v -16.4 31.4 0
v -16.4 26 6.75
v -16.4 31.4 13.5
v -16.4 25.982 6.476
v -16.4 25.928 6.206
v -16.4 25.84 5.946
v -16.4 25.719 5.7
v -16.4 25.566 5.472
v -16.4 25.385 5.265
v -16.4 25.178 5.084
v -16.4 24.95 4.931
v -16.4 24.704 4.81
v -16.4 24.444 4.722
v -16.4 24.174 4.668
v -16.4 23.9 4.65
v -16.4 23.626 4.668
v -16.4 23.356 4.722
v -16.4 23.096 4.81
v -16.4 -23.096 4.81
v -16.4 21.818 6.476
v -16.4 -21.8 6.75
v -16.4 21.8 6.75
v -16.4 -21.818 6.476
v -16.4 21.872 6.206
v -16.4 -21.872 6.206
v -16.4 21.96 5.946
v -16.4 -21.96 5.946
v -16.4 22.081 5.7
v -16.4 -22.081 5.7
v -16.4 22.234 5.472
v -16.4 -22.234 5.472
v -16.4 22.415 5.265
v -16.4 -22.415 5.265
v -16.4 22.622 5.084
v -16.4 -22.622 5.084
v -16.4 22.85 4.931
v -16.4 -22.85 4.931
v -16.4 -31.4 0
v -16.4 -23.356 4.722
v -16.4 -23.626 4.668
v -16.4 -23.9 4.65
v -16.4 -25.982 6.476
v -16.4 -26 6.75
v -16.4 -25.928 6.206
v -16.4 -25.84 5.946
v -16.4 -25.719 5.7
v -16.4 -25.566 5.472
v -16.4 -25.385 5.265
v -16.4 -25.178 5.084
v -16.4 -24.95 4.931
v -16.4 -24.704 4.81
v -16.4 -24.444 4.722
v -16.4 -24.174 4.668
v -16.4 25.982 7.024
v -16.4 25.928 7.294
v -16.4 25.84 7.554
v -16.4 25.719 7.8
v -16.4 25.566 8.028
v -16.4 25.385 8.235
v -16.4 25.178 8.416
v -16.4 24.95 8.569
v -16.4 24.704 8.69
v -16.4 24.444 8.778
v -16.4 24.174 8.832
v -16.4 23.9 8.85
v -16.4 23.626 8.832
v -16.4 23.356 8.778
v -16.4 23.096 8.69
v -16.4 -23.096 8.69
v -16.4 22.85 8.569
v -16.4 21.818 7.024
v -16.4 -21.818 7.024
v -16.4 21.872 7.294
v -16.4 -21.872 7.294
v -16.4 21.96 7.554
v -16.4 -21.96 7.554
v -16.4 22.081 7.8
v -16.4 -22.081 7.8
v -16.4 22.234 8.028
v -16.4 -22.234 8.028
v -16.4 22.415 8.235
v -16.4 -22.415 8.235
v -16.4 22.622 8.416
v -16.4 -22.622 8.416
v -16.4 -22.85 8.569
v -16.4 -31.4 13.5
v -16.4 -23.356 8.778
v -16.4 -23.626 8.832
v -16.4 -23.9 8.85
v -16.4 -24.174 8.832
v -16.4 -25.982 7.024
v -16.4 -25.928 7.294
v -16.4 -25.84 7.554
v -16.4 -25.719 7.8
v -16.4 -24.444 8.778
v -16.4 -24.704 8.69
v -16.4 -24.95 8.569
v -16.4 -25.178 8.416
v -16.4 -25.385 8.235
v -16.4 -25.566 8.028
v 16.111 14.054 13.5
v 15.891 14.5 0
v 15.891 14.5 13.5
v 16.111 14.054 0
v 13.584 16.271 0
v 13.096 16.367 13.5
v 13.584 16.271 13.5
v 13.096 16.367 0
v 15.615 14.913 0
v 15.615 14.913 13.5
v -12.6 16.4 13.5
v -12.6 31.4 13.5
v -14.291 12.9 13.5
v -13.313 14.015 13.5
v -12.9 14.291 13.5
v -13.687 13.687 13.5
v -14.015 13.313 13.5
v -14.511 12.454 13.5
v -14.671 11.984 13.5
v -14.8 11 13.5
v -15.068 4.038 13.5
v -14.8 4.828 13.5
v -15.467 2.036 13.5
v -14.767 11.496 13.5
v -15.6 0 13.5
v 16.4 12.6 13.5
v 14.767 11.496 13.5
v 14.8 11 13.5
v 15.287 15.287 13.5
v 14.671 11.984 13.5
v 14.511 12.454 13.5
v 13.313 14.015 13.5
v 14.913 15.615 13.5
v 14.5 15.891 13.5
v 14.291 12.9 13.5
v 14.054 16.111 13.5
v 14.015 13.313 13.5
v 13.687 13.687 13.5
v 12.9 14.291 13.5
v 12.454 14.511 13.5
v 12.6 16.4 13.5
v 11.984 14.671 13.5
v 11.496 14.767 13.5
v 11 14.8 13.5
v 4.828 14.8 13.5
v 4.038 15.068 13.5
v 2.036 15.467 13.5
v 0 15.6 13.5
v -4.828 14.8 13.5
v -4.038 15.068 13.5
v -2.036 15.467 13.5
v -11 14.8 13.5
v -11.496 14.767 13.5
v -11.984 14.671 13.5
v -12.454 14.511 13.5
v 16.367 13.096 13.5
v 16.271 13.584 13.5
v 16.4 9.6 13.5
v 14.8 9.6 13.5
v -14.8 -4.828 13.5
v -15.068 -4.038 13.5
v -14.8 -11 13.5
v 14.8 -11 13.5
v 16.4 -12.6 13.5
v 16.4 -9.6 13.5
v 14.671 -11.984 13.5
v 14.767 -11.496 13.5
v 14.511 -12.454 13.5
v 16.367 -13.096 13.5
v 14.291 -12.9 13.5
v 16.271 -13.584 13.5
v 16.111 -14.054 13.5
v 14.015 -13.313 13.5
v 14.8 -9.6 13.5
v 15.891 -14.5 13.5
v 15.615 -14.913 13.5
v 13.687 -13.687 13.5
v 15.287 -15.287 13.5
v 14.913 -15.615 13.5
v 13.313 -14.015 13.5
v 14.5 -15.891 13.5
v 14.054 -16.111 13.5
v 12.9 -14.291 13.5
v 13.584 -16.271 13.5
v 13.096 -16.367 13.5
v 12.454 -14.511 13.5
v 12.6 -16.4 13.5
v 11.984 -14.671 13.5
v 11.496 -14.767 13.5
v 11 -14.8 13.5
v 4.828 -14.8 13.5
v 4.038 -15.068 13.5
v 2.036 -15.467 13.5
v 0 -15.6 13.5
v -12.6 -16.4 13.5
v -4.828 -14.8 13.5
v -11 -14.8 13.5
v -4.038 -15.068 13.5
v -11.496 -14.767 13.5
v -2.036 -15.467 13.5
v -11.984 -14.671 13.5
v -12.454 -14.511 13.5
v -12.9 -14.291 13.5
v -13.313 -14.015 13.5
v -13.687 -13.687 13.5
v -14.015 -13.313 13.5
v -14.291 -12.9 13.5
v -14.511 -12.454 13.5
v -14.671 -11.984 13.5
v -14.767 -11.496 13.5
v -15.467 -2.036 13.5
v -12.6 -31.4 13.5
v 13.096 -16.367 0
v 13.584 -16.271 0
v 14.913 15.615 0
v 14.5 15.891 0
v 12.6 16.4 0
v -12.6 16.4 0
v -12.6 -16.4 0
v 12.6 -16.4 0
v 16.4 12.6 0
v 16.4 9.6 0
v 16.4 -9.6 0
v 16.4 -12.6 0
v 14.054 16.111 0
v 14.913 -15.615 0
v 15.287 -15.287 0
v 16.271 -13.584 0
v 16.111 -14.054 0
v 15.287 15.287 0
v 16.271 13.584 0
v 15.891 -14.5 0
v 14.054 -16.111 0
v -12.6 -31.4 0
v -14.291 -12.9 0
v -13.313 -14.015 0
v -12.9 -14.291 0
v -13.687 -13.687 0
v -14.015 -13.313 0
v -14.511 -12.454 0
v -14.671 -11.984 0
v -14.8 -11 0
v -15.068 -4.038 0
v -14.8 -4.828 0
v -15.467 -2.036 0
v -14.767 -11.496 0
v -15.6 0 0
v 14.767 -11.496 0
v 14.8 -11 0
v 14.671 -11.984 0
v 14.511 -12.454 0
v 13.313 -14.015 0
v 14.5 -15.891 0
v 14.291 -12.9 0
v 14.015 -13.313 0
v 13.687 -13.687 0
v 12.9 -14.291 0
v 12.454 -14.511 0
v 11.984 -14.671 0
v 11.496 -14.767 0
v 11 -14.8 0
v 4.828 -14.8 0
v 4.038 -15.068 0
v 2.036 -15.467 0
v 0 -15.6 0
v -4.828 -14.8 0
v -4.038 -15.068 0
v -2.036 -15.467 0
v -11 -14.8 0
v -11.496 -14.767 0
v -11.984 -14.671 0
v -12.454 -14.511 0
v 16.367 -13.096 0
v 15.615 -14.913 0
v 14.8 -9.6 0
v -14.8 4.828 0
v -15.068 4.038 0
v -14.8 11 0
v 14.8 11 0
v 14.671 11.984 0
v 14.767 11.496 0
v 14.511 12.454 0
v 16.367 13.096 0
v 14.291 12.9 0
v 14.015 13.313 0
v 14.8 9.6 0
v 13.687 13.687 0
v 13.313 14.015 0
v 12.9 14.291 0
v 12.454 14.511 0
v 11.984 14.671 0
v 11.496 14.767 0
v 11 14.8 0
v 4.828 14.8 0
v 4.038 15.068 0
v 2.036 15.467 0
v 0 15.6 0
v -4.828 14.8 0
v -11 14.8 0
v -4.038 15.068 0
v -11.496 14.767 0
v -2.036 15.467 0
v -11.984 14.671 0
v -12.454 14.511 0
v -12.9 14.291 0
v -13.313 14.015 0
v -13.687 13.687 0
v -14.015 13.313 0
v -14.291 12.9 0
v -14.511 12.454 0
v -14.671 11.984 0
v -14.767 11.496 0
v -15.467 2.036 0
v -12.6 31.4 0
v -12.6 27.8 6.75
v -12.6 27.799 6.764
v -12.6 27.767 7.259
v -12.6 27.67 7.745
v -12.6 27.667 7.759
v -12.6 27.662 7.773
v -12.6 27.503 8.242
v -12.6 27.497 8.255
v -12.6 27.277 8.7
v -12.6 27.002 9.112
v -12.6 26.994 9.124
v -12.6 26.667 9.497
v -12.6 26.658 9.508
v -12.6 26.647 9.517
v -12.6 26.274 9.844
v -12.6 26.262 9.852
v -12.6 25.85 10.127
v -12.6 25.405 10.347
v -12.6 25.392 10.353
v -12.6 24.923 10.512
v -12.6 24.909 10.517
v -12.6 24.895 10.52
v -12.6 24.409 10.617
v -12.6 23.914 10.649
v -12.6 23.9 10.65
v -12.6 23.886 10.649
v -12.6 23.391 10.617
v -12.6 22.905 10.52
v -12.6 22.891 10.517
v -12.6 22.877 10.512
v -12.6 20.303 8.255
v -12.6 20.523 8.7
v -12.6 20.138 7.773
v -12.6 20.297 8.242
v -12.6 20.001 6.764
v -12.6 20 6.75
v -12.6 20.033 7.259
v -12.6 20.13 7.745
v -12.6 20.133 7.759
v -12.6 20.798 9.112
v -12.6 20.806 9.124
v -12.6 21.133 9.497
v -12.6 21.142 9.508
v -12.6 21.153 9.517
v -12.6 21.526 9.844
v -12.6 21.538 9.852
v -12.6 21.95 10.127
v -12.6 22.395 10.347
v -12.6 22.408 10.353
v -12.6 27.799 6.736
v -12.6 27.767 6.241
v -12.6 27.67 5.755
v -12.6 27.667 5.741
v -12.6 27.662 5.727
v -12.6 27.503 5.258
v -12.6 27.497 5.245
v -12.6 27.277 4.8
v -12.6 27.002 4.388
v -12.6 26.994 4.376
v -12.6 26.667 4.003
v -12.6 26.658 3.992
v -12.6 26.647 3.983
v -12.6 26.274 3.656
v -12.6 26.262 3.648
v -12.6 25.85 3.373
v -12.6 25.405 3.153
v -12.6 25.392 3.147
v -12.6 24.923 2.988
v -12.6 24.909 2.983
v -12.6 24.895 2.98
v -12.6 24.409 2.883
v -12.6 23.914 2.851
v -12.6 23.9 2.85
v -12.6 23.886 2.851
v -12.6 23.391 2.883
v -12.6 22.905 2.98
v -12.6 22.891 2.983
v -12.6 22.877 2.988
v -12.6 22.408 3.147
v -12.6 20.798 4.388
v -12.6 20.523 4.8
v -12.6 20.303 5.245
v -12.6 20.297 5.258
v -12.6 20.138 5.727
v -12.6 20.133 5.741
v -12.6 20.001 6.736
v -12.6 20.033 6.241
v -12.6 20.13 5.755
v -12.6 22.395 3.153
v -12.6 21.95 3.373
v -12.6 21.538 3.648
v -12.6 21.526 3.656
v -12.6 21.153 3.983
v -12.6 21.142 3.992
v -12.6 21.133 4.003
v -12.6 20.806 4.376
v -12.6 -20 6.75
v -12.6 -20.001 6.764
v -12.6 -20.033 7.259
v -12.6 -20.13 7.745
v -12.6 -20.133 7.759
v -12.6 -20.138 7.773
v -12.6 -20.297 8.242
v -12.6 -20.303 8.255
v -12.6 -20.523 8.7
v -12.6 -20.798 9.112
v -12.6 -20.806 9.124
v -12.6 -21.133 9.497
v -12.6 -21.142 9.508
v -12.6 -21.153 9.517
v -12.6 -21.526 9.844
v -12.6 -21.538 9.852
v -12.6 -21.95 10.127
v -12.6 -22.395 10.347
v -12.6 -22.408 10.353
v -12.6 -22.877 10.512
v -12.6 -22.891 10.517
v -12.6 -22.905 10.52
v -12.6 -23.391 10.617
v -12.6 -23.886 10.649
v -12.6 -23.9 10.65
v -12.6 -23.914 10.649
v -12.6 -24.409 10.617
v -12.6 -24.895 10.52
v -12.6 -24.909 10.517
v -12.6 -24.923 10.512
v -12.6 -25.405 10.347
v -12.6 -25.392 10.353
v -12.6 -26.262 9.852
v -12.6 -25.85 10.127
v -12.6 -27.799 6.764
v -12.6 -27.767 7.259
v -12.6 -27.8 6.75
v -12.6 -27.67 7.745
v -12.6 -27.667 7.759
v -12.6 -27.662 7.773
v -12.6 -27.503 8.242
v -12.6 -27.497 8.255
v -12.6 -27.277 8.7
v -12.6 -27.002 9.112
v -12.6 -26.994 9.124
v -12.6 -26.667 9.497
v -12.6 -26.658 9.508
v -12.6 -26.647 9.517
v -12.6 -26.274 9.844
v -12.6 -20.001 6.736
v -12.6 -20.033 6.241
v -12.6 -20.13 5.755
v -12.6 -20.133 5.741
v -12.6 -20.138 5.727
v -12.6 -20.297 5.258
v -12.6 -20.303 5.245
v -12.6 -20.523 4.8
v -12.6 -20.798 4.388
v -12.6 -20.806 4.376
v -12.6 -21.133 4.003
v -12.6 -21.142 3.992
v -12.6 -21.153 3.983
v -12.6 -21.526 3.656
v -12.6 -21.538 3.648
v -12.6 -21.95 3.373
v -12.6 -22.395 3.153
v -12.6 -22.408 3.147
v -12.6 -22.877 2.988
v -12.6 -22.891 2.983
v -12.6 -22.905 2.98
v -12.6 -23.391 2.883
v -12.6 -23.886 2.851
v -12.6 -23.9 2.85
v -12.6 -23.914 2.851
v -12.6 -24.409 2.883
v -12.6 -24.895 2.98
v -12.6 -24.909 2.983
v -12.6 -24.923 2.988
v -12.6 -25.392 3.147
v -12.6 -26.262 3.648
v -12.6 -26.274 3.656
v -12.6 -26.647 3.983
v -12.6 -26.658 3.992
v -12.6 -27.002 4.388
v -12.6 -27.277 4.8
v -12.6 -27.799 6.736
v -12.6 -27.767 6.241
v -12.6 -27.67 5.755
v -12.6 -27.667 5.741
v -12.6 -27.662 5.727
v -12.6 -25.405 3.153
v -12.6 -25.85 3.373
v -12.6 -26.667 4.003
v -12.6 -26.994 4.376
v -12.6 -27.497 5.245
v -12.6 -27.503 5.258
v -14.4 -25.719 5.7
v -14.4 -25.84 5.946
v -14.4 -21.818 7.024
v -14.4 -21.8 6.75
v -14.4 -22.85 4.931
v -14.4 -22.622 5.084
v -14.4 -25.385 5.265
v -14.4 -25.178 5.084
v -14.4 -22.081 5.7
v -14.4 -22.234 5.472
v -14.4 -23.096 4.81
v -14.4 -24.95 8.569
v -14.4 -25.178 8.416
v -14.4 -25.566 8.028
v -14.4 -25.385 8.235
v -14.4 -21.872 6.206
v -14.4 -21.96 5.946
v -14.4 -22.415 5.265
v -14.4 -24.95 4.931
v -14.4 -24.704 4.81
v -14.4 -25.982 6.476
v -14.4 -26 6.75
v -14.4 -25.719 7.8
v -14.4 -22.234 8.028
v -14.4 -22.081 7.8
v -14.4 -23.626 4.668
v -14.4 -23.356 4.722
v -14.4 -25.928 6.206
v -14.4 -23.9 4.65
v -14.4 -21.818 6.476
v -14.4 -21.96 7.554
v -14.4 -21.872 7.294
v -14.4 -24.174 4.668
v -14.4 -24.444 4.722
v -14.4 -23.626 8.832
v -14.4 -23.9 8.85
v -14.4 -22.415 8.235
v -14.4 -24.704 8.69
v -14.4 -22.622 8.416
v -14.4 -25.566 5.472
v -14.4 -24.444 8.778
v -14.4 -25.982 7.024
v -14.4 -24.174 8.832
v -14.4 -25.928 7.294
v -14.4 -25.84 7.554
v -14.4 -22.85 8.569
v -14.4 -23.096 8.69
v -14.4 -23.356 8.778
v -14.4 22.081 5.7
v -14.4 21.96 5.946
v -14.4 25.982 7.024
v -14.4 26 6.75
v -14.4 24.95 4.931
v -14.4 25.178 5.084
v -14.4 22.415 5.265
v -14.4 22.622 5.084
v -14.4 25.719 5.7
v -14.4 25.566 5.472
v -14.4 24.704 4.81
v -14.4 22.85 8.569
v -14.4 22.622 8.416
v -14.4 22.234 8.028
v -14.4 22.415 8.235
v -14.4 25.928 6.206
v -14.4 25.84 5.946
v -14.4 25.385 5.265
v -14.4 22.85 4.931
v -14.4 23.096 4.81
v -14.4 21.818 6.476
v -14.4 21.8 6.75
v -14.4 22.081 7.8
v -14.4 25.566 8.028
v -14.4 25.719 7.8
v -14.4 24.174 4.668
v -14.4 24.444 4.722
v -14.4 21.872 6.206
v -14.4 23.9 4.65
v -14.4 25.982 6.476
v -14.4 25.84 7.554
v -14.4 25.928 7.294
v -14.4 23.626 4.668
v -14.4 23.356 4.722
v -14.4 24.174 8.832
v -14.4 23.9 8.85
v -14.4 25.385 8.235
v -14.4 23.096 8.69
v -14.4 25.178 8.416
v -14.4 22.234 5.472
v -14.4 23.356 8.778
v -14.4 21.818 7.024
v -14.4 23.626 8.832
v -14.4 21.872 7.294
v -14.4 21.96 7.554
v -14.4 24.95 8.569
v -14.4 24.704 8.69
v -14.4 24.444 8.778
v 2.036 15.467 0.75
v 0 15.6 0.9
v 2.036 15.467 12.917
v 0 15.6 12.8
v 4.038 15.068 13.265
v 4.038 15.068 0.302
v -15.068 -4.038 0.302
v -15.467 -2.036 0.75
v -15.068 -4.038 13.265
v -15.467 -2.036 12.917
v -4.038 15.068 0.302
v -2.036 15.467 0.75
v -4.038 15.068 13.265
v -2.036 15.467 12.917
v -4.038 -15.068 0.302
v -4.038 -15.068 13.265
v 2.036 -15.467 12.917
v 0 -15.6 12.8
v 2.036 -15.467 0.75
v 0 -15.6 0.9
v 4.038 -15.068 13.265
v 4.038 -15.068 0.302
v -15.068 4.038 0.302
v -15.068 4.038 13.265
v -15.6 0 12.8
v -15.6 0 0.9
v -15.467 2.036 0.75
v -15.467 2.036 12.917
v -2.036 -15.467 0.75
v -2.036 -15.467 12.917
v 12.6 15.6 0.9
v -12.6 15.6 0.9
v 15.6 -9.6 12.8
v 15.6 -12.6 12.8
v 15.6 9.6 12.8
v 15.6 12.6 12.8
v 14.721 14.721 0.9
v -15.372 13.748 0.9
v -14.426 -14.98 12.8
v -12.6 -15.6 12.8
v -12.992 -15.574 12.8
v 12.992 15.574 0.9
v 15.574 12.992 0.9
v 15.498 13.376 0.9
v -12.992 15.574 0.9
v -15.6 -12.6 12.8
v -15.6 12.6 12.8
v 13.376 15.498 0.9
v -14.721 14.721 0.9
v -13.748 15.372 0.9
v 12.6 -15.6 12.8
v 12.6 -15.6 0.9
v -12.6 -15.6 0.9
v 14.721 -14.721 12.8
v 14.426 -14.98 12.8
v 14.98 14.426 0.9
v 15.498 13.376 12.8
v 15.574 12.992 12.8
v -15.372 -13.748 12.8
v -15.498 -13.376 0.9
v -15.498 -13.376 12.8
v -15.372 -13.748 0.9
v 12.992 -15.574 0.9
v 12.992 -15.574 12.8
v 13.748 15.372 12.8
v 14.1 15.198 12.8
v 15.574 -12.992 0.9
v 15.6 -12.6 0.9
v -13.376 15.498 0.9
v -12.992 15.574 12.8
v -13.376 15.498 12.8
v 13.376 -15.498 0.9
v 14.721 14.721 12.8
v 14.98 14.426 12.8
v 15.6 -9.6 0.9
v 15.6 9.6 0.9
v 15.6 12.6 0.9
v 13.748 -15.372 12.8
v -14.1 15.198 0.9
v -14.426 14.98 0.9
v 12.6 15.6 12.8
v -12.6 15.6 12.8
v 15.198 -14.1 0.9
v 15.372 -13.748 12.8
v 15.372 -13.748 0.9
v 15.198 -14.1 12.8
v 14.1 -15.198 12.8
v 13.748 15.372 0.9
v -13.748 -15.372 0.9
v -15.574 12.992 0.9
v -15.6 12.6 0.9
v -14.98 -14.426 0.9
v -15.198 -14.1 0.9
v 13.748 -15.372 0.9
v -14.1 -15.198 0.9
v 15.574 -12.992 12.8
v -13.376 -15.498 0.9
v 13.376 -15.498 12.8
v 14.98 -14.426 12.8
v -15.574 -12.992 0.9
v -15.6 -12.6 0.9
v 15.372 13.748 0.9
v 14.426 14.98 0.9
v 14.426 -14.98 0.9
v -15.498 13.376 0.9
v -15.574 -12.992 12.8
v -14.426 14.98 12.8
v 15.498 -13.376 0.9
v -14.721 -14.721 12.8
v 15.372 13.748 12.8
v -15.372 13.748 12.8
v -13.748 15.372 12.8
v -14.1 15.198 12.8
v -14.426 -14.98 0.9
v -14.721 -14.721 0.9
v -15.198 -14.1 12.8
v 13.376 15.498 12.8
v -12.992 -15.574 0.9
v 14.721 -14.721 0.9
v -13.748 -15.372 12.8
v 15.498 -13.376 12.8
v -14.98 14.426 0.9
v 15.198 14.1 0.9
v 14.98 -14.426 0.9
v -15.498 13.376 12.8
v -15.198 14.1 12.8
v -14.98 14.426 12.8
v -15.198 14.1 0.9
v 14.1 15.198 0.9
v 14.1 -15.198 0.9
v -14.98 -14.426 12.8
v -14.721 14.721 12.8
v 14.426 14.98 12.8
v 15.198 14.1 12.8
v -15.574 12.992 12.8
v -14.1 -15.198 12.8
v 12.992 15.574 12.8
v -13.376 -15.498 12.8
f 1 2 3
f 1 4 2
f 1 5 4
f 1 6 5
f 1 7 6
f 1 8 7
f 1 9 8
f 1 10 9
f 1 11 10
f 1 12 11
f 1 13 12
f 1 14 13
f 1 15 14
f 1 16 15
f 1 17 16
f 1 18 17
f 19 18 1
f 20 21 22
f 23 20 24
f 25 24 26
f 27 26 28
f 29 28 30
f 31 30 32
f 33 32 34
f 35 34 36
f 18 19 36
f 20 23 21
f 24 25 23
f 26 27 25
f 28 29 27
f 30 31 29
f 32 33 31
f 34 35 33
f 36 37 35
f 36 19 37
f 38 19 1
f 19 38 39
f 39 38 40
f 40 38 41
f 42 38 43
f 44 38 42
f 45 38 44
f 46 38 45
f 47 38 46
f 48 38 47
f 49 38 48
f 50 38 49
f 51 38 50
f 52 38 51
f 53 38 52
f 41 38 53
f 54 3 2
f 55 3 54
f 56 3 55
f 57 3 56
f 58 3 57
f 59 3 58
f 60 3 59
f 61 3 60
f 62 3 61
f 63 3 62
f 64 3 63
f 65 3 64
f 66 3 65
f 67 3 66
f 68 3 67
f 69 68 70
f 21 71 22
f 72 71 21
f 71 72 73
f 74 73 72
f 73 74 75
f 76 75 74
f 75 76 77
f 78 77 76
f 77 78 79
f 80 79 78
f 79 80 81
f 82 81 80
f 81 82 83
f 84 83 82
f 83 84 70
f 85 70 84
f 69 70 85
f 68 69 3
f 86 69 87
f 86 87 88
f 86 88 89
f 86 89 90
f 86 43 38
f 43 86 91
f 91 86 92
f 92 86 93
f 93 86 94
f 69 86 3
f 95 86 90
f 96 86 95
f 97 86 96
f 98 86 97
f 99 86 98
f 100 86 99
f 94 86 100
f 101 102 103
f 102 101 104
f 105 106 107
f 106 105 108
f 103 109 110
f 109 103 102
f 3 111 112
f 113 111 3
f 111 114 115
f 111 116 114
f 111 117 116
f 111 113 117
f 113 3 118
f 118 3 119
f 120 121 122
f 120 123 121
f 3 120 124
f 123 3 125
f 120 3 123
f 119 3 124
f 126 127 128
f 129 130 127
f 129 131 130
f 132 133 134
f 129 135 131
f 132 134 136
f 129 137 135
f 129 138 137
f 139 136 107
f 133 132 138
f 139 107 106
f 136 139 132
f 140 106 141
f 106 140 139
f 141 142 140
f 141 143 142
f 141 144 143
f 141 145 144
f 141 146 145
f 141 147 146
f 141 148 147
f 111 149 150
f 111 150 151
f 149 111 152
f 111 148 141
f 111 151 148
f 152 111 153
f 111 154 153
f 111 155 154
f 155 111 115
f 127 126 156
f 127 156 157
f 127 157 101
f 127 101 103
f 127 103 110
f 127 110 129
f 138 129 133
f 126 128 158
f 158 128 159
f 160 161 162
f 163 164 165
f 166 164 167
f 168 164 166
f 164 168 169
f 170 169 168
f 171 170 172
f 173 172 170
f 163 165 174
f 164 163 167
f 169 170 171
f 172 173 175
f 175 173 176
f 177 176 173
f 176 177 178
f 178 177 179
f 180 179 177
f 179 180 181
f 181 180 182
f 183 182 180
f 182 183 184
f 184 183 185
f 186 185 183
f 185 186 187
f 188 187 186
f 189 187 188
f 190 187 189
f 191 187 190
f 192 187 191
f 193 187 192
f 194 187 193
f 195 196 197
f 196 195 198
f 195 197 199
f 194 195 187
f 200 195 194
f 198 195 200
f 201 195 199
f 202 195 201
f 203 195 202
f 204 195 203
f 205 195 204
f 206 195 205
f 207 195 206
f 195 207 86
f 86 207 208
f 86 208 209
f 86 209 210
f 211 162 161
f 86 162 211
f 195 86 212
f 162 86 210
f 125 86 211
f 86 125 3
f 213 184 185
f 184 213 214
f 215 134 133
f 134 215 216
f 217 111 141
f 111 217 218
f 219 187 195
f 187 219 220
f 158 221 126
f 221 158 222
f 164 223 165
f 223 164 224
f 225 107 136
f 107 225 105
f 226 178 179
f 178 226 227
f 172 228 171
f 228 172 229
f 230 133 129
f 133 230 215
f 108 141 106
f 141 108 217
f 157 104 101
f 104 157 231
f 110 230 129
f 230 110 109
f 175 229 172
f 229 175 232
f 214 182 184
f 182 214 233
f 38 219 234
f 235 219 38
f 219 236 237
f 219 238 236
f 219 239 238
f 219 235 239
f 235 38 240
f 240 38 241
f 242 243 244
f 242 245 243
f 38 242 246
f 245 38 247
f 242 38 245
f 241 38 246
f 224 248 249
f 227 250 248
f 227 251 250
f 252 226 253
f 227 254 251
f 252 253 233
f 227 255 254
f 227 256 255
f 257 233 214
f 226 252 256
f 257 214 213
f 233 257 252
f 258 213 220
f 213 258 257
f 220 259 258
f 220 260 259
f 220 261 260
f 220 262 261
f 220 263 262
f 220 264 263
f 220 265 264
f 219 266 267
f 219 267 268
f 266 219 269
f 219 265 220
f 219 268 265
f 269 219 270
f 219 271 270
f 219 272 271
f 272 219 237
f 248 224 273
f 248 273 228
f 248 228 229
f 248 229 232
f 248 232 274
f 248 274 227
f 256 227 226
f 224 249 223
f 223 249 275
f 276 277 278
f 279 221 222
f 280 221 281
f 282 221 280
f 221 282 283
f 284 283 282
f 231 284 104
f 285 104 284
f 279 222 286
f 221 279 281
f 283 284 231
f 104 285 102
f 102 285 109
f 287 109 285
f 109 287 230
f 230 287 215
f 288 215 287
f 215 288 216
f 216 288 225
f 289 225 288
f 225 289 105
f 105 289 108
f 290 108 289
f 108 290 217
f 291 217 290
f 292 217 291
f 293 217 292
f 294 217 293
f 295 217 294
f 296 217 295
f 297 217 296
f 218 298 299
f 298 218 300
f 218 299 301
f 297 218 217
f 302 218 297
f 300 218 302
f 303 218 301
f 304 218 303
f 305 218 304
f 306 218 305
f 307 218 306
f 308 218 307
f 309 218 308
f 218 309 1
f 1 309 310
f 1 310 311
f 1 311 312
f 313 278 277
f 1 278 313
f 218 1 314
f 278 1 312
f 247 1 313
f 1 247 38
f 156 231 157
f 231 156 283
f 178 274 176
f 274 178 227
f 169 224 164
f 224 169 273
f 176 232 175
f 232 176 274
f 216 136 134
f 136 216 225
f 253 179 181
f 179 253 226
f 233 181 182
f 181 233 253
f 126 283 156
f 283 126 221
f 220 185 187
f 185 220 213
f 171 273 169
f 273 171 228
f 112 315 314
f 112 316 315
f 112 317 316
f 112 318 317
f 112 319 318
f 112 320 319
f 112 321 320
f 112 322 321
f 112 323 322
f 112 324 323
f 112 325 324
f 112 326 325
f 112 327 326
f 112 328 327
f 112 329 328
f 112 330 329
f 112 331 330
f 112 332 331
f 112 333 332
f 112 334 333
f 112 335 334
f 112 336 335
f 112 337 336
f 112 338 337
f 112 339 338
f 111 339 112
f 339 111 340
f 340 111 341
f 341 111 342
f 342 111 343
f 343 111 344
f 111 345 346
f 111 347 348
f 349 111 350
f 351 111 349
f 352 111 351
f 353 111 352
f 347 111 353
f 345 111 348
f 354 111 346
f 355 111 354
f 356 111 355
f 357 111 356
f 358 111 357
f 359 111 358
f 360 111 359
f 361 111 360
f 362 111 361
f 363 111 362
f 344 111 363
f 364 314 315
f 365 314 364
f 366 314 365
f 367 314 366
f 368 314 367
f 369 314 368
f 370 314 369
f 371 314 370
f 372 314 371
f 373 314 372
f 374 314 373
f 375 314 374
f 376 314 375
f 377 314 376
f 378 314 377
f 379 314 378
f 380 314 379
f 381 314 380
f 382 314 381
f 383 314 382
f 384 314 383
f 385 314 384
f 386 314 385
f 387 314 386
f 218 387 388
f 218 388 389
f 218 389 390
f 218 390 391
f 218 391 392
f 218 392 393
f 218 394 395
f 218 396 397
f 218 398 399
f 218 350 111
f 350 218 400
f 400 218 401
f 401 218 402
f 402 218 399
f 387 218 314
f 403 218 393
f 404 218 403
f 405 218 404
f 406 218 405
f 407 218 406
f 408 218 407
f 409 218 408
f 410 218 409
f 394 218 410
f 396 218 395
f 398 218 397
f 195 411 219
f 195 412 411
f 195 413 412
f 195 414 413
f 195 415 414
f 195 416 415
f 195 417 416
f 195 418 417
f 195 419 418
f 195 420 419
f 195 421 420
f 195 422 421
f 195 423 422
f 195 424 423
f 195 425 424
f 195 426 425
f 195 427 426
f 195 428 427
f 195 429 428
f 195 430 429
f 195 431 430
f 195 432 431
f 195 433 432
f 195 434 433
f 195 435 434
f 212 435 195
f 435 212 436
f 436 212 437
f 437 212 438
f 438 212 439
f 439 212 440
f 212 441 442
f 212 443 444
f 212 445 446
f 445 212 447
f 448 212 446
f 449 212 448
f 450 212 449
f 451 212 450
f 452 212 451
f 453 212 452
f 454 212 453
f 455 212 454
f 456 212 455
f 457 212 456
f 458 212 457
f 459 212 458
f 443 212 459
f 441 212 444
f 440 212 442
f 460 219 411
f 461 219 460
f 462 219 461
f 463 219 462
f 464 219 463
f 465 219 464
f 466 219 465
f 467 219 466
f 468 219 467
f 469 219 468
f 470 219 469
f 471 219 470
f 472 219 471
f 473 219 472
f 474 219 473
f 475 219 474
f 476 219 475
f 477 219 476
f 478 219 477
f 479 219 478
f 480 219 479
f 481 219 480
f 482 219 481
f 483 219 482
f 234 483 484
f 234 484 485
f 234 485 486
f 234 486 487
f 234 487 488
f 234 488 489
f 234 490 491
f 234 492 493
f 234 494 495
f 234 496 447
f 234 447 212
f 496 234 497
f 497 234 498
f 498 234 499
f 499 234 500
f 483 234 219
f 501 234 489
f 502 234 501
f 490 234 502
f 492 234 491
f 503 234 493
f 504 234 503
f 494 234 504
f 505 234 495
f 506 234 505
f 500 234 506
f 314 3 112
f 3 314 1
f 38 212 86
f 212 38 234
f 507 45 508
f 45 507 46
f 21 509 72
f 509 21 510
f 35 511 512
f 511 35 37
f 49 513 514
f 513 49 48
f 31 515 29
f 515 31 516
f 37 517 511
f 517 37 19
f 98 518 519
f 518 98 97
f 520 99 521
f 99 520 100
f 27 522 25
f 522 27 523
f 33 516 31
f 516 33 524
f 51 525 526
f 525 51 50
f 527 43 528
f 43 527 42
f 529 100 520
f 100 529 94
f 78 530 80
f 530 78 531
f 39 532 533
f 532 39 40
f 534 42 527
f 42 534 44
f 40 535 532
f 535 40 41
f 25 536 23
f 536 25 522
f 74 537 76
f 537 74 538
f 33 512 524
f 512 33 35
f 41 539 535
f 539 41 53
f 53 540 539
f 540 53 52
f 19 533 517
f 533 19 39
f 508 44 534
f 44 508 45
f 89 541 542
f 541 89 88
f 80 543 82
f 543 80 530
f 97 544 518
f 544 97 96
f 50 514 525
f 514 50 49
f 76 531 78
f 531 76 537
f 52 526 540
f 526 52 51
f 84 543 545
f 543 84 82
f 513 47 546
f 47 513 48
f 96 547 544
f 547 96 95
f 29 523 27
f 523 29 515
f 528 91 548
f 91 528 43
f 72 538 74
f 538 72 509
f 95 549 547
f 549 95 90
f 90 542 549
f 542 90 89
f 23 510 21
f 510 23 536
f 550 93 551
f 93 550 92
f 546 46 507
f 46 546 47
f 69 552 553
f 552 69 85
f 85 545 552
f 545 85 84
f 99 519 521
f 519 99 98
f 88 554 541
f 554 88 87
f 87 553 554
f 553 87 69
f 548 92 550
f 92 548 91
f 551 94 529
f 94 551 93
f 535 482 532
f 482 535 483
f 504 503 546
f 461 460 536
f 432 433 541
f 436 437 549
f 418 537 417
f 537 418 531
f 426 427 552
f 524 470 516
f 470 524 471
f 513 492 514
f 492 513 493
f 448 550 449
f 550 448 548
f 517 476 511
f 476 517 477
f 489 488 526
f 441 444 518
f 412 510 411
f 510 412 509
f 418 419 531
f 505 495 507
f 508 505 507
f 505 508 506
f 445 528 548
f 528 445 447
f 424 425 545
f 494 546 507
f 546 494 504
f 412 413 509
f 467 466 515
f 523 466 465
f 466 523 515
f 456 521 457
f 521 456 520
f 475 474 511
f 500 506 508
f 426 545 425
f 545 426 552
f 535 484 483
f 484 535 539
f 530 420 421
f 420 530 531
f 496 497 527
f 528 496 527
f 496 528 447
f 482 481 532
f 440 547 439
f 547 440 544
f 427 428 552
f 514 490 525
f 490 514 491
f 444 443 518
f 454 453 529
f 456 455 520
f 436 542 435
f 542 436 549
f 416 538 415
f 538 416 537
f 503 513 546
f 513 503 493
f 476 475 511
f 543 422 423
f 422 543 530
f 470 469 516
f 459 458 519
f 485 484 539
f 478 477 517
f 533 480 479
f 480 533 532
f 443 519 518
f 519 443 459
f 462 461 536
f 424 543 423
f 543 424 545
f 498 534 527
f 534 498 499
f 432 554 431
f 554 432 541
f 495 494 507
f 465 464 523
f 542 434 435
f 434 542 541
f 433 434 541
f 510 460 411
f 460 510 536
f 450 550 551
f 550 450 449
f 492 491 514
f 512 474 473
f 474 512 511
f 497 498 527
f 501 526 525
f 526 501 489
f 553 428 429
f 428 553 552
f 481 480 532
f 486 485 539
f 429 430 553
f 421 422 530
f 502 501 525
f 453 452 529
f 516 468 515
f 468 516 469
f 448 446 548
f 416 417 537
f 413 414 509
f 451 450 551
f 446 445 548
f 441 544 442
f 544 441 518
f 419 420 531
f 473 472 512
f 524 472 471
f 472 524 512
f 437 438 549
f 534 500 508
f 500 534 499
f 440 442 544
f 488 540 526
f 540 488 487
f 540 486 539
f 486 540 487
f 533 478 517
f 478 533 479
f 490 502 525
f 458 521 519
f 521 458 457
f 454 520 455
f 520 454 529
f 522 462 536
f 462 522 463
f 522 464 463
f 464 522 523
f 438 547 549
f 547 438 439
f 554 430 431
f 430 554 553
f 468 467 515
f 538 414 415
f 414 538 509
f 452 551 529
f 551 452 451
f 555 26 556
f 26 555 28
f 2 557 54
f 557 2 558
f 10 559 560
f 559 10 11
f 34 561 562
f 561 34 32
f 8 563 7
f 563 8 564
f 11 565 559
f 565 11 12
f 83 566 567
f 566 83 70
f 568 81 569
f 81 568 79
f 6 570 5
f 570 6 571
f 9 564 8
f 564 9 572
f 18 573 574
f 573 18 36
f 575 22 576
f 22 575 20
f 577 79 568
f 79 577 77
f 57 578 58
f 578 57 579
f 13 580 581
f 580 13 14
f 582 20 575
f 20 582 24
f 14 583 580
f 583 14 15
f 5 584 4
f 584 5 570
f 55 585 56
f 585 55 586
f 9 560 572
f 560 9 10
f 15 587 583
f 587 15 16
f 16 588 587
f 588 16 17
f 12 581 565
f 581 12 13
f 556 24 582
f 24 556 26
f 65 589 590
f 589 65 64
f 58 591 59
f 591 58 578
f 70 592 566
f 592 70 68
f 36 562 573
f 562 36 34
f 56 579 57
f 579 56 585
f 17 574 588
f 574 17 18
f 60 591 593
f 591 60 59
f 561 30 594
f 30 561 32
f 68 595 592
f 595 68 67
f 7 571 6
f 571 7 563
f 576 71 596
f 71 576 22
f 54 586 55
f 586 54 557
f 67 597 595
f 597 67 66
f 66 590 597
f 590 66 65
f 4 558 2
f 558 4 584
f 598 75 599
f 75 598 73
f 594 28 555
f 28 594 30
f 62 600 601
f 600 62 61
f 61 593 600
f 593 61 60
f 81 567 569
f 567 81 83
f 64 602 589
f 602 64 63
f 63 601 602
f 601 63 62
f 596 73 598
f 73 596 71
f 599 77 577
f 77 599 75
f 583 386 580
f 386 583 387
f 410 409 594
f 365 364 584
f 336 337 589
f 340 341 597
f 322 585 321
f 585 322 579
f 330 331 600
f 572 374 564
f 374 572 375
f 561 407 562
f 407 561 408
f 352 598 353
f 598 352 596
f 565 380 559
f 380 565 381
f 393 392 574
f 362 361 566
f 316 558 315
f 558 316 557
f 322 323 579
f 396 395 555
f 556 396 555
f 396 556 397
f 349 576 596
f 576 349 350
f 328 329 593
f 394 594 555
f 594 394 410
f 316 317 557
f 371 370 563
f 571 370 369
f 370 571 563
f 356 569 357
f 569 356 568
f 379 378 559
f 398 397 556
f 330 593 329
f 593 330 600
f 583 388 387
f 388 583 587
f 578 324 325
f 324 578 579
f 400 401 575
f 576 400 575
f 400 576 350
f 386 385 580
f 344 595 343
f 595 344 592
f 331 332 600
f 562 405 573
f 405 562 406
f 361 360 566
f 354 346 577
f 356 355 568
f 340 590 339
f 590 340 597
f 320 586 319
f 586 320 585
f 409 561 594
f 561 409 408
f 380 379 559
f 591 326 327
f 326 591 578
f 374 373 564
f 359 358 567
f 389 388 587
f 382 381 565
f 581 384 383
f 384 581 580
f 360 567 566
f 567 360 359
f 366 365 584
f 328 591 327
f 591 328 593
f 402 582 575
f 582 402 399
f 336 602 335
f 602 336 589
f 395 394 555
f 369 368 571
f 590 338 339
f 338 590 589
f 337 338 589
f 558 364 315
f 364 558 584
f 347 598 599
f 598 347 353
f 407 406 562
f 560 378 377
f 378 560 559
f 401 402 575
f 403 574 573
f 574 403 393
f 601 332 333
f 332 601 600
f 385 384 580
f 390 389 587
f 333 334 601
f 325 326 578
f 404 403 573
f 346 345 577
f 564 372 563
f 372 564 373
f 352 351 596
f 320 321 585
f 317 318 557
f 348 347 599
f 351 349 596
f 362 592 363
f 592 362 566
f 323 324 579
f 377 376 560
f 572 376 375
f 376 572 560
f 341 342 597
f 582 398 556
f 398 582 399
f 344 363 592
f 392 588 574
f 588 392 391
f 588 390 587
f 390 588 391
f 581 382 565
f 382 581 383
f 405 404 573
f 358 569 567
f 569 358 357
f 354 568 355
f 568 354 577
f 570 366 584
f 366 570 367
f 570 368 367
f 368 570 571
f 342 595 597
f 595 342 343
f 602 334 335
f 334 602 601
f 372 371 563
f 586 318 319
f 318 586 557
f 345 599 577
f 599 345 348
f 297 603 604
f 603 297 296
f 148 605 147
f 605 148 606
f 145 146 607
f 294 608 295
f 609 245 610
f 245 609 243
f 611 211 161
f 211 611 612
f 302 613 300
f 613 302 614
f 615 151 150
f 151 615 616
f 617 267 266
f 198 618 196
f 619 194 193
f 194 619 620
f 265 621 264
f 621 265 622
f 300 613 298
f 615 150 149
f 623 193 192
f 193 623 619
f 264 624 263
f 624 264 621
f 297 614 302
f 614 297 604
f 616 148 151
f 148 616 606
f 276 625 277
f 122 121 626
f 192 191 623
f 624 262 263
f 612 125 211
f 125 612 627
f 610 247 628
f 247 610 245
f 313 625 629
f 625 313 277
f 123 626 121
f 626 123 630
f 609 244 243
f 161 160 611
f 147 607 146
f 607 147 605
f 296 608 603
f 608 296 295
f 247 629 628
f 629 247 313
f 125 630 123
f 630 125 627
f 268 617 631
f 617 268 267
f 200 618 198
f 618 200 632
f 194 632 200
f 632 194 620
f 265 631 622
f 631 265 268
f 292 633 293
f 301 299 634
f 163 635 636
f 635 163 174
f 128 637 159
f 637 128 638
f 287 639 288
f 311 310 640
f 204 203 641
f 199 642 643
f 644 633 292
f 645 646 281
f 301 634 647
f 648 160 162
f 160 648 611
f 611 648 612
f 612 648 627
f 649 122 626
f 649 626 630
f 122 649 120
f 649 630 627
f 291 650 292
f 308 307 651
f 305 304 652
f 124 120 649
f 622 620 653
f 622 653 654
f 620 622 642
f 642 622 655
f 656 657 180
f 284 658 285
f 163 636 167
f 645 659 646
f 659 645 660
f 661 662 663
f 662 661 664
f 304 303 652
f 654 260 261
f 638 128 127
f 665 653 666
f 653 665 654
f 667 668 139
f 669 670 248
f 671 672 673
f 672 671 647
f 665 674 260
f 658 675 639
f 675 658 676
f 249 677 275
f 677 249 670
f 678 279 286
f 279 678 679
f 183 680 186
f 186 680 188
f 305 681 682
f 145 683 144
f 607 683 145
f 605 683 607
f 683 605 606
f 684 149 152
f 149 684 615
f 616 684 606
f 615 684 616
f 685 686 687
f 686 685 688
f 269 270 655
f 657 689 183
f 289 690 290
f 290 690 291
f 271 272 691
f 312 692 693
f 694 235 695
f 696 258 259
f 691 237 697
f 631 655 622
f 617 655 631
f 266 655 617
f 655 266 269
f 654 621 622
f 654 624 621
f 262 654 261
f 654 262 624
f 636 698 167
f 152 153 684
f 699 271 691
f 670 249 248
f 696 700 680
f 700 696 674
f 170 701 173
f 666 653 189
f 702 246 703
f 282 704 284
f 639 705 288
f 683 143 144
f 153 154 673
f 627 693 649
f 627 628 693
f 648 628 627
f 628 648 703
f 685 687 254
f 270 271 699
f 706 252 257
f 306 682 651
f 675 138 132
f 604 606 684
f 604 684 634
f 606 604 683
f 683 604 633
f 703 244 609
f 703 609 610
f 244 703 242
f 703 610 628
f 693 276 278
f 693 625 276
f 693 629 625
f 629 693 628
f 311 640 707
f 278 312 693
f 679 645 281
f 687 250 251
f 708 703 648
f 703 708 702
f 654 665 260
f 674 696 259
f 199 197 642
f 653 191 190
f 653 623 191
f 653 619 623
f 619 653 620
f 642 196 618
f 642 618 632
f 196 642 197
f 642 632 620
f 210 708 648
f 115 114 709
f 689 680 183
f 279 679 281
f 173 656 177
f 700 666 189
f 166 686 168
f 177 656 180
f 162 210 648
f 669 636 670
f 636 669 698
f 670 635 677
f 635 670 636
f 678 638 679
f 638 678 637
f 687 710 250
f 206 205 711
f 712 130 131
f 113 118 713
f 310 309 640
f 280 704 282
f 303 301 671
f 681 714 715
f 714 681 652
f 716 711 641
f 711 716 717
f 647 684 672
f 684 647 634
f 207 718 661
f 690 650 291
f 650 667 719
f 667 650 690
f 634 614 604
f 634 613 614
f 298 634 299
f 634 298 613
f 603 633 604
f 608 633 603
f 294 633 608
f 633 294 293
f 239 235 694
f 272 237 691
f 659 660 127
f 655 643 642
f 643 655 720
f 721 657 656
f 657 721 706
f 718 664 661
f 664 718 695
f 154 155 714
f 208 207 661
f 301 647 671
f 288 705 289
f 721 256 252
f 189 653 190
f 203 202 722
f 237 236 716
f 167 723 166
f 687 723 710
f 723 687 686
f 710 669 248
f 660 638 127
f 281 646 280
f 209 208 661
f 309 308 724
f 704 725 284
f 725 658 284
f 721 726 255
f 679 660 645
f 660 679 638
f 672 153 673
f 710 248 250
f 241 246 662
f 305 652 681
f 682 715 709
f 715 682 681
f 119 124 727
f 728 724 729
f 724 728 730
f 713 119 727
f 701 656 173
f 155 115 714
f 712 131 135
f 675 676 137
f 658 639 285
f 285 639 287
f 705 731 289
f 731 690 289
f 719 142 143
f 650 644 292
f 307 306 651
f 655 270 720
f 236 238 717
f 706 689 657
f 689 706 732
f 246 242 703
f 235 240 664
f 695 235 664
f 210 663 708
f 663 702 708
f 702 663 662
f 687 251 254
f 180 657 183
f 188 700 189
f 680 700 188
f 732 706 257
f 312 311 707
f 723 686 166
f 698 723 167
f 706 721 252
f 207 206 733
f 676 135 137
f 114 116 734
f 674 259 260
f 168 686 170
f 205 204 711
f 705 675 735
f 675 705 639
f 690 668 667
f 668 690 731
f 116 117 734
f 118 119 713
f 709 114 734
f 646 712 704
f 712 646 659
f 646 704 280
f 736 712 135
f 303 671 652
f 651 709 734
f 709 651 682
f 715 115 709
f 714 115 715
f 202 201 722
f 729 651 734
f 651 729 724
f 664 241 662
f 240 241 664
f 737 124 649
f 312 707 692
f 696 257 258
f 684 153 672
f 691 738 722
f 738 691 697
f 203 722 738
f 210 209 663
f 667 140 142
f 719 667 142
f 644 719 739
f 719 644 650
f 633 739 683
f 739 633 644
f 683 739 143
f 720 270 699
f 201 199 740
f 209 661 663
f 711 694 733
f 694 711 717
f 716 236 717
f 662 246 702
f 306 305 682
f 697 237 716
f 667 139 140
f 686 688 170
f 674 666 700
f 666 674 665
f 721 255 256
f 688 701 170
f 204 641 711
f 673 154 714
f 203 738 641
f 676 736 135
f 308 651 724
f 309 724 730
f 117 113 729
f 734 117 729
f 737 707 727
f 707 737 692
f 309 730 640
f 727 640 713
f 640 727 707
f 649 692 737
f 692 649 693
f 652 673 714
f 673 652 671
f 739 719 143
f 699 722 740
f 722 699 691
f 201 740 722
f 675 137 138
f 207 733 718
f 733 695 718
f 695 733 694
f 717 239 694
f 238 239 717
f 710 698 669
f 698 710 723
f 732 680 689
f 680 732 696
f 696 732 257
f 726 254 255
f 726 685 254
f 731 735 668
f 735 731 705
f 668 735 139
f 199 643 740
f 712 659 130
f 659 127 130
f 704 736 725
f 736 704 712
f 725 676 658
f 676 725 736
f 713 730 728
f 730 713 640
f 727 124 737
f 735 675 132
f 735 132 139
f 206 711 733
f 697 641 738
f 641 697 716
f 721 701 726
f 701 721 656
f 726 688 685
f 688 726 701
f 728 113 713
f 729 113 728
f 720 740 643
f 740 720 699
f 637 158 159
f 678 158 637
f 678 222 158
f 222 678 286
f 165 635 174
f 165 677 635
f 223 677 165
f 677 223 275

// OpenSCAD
// Parametric fan shroud and holder for a square fan.

$fn=48;

fw = 30; // fan square outside width
fd = 28.2; // Fan duct diameter. Manipulated to get 0.8 wall thickness
fh = 10.5; // Fan depth
fcd = 6; // fan corner diameter

sh = 33; // shroud height
swt = 0.8; // shroud wall thickness
sfh = 0.8; // shroud 'foot' height
stw = 5; // shroud tip outside width
stl = 20; // shroud tip outside length
std = 3; // shroud tip corner od
ste = 1; // shroud tip extends
sx = 22.5; // shroud x offset
sy = 0; // shroud y offset

be = 15; // Bracket extends past sides of the fan by this much.

module screw_hole(d1, d2, h1, h2) {
    // d1: hole id
    // d2: countersink hole id
    // h2: Total hole length
    union() {
        // Small hole all the way through
        cylinder(h2, d=d1);
        translate([0,0,h1]) cylinder((d2-d1)/2, d1=d1, d2=d2);
        translate([0,0,h1+(d2-d1)/2]) cylinder(h2-h1-(d2-d1)/2, d=d2);
    }
}

module rounded_rectangle(w,l,h,d) {
    x = (w-d)/2;
    y = (l-d)/2;
    hull() {
        translate([x,y,0]) cylinder(h, d=d);
        translate([-x,y,0]) cylinder(h, d=d);
        translate([-x,-y, 0]) cylinder(h, d=d);
        translate([x,-y, 0]) cylinder(h, d=d);

    };
};

// shroud
// translate ([fw+8,0,0]) {
// difference() {
//     union () {
//         rounded_rectangle(fw,fw,sfh,fcd);
//         hull() {
//             translate([0,0, sfh]) cylinder(0.2, d=fw);
//             translate([sx,sy,sfh+sh-0.2]) rounded_rectangle(stw,stl,0.2, std);
//         };
//         translate([sx,sy,sfh+sh]) rounded_rectangle(stw,stl,ste, std);
//         };
//     cylinder(sfh, d=fw-2*swt);
//     hull() {
//         translate([0,0, sfh]) cylinder(0.2, d=fw-2*swt);
//         translate([sx,sy,sfh+sh-0.2]) rounded_rectangle(stw-2*swt,stl-2*swt,0.2, std-2*swt);
//     };
//     translate([sx,sy,sfh+sh]) rounded_rectangle(stw-2*swt,stl-2*swt,ste, std-2*swt);
// };
// };

//holder
holder_height = fh+sfh+2*swt+0.6;
fwa =fw+1.2; // Adjust the fan size to allow for overextrusion.
echo(holder_height);
echo(fwa);
difference(){
    union() {
        rounded_rectangle(fwa+2*swt,fwa+2*swt,holder_height, fcd+2*swt);
        translate([-fwa/2-swt,-fwa/2-swt-be,0]) cube([swt+fcd/2,fwa+2*swt+2*be, holder_height]);
    }
    cylinder(holder_height, d=fwa);
    hull(){
        rounded_rectangle(fwa-2*swt,fwa-2*swt,holder_height, fcd+2*swt);
        translate([0,0,swt+0.1,]) rounded_rectangle(fwa,fwa,holder_height-2*swt, fcd);
    };
    translate([fwa/2, 0, holder_height/2]) cube([fwa, fwa-12, holder_height], true);
    translate([-fwa/2-swt,-fwa/2-swt-be/2,holder_height/2]) rotate([0,90,0]) screw_hole(4.2,8,2,swt+fcd/2);
    translate([-fwa/2-swt,fwa/2+swt+be/2,holder_height/2]) rotate([0,90,0]) screw_hole(4.2,8,2,swt+fcd/2);
};
